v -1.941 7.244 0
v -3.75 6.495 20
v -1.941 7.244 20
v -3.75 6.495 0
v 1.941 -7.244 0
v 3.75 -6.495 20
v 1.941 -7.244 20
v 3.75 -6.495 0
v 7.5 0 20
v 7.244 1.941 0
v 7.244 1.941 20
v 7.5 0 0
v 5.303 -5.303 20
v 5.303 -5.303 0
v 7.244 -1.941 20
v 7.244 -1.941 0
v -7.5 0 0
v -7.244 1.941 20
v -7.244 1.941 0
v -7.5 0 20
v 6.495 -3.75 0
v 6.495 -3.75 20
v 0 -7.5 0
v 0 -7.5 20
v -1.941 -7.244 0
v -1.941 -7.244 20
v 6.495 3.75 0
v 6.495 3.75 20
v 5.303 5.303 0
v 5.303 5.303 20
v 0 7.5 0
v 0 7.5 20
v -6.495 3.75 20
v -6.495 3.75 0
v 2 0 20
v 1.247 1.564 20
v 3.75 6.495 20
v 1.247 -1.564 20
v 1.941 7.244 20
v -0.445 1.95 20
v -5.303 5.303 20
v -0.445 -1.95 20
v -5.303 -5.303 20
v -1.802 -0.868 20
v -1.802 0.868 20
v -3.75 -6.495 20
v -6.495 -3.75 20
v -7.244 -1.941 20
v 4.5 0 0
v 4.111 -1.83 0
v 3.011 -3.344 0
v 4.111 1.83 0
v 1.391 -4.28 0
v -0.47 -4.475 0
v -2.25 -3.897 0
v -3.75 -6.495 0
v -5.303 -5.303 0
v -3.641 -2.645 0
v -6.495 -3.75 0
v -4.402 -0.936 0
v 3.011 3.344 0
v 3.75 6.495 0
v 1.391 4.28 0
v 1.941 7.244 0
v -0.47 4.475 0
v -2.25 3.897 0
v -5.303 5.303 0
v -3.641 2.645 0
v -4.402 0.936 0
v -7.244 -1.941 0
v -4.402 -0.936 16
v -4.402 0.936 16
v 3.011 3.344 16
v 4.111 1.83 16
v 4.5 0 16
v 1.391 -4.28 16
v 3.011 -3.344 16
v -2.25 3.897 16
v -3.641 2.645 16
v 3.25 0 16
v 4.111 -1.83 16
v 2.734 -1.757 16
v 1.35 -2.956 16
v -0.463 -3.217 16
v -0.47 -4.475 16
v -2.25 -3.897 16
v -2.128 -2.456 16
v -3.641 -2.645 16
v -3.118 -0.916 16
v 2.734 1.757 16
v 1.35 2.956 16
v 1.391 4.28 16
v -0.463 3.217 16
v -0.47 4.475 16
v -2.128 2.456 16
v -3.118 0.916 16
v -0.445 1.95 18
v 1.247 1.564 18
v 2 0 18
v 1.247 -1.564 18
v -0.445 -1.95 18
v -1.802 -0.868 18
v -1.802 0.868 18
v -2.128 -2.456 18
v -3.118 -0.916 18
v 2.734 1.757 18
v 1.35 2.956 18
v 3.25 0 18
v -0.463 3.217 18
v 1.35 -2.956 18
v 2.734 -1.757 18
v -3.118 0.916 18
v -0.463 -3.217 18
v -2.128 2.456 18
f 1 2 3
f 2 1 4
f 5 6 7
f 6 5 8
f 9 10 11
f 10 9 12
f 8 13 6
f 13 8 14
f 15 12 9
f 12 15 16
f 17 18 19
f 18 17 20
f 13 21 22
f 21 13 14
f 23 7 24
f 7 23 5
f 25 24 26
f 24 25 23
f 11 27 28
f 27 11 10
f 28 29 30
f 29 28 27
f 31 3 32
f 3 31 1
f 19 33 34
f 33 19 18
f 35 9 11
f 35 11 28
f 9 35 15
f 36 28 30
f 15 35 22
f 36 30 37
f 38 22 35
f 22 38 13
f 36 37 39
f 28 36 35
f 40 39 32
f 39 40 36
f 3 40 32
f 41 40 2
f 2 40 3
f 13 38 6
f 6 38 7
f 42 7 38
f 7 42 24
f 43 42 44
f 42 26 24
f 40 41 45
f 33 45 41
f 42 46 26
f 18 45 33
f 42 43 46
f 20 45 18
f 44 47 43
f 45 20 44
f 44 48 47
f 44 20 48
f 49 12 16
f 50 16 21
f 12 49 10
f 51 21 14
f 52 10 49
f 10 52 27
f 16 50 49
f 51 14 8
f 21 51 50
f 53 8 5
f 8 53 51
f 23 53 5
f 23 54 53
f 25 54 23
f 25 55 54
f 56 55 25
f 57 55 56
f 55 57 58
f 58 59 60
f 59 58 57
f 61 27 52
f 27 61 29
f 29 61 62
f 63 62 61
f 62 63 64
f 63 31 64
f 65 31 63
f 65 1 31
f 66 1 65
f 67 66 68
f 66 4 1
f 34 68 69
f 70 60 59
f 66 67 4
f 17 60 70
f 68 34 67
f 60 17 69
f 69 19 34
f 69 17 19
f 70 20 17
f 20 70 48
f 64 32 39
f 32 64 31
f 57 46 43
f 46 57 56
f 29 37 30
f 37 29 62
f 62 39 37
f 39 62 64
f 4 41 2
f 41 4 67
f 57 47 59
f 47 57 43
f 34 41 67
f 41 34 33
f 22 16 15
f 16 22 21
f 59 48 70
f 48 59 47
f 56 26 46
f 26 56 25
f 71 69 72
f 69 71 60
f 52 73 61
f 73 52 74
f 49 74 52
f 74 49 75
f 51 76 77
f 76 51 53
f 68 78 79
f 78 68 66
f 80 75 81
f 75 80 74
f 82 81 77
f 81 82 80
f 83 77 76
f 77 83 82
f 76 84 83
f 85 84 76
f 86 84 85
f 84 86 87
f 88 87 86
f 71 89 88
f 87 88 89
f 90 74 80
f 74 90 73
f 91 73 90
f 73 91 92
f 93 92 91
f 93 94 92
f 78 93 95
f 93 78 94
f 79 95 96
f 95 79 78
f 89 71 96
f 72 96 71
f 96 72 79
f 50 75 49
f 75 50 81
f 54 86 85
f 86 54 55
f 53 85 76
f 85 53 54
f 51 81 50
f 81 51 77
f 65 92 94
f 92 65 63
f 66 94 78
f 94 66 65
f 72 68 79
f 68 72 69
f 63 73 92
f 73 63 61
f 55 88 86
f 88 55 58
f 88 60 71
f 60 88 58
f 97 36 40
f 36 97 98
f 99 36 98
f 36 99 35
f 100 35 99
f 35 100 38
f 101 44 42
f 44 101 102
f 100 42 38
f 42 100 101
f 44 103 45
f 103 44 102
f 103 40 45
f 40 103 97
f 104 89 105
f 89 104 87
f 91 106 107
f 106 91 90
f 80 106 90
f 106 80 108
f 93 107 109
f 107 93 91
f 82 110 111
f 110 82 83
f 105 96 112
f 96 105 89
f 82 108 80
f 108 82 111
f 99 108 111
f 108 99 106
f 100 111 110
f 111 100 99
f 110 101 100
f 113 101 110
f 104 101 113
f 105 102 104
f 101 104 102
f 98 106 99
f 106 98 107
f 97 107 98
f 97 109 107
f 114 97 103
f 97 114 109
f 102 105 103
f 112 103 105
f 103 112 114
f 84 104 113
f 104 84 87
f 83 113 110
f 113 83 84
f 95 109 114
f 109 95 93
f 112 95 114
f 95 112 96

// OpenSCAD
// The base for  the open optics rail made from Open Beam
// holds a 13mm smooth rod


//Variables
w=15; //Width of Open Beam
d=9; // rod diameter
x =6.5; //width of screw head
g =2; //heigth of screw head with some margin
z =4; //width of screw thread with margin
i=2; //screw heigth
a=20; //total heigth

module base(){
				difference(){
			difference(){
		difference (){
		cylinder(a, w/2,w/2);//whole chuck
		cylinder(a-g*2,d/2,d/2); //magnet hole
				}
			cylinder(a,z/2,z/2); //screw hole	
					}
				translate ([0,0,a-g-2])
				cylinder(g,x/2,x/2); //head of screw hole
						}
		}

base();
